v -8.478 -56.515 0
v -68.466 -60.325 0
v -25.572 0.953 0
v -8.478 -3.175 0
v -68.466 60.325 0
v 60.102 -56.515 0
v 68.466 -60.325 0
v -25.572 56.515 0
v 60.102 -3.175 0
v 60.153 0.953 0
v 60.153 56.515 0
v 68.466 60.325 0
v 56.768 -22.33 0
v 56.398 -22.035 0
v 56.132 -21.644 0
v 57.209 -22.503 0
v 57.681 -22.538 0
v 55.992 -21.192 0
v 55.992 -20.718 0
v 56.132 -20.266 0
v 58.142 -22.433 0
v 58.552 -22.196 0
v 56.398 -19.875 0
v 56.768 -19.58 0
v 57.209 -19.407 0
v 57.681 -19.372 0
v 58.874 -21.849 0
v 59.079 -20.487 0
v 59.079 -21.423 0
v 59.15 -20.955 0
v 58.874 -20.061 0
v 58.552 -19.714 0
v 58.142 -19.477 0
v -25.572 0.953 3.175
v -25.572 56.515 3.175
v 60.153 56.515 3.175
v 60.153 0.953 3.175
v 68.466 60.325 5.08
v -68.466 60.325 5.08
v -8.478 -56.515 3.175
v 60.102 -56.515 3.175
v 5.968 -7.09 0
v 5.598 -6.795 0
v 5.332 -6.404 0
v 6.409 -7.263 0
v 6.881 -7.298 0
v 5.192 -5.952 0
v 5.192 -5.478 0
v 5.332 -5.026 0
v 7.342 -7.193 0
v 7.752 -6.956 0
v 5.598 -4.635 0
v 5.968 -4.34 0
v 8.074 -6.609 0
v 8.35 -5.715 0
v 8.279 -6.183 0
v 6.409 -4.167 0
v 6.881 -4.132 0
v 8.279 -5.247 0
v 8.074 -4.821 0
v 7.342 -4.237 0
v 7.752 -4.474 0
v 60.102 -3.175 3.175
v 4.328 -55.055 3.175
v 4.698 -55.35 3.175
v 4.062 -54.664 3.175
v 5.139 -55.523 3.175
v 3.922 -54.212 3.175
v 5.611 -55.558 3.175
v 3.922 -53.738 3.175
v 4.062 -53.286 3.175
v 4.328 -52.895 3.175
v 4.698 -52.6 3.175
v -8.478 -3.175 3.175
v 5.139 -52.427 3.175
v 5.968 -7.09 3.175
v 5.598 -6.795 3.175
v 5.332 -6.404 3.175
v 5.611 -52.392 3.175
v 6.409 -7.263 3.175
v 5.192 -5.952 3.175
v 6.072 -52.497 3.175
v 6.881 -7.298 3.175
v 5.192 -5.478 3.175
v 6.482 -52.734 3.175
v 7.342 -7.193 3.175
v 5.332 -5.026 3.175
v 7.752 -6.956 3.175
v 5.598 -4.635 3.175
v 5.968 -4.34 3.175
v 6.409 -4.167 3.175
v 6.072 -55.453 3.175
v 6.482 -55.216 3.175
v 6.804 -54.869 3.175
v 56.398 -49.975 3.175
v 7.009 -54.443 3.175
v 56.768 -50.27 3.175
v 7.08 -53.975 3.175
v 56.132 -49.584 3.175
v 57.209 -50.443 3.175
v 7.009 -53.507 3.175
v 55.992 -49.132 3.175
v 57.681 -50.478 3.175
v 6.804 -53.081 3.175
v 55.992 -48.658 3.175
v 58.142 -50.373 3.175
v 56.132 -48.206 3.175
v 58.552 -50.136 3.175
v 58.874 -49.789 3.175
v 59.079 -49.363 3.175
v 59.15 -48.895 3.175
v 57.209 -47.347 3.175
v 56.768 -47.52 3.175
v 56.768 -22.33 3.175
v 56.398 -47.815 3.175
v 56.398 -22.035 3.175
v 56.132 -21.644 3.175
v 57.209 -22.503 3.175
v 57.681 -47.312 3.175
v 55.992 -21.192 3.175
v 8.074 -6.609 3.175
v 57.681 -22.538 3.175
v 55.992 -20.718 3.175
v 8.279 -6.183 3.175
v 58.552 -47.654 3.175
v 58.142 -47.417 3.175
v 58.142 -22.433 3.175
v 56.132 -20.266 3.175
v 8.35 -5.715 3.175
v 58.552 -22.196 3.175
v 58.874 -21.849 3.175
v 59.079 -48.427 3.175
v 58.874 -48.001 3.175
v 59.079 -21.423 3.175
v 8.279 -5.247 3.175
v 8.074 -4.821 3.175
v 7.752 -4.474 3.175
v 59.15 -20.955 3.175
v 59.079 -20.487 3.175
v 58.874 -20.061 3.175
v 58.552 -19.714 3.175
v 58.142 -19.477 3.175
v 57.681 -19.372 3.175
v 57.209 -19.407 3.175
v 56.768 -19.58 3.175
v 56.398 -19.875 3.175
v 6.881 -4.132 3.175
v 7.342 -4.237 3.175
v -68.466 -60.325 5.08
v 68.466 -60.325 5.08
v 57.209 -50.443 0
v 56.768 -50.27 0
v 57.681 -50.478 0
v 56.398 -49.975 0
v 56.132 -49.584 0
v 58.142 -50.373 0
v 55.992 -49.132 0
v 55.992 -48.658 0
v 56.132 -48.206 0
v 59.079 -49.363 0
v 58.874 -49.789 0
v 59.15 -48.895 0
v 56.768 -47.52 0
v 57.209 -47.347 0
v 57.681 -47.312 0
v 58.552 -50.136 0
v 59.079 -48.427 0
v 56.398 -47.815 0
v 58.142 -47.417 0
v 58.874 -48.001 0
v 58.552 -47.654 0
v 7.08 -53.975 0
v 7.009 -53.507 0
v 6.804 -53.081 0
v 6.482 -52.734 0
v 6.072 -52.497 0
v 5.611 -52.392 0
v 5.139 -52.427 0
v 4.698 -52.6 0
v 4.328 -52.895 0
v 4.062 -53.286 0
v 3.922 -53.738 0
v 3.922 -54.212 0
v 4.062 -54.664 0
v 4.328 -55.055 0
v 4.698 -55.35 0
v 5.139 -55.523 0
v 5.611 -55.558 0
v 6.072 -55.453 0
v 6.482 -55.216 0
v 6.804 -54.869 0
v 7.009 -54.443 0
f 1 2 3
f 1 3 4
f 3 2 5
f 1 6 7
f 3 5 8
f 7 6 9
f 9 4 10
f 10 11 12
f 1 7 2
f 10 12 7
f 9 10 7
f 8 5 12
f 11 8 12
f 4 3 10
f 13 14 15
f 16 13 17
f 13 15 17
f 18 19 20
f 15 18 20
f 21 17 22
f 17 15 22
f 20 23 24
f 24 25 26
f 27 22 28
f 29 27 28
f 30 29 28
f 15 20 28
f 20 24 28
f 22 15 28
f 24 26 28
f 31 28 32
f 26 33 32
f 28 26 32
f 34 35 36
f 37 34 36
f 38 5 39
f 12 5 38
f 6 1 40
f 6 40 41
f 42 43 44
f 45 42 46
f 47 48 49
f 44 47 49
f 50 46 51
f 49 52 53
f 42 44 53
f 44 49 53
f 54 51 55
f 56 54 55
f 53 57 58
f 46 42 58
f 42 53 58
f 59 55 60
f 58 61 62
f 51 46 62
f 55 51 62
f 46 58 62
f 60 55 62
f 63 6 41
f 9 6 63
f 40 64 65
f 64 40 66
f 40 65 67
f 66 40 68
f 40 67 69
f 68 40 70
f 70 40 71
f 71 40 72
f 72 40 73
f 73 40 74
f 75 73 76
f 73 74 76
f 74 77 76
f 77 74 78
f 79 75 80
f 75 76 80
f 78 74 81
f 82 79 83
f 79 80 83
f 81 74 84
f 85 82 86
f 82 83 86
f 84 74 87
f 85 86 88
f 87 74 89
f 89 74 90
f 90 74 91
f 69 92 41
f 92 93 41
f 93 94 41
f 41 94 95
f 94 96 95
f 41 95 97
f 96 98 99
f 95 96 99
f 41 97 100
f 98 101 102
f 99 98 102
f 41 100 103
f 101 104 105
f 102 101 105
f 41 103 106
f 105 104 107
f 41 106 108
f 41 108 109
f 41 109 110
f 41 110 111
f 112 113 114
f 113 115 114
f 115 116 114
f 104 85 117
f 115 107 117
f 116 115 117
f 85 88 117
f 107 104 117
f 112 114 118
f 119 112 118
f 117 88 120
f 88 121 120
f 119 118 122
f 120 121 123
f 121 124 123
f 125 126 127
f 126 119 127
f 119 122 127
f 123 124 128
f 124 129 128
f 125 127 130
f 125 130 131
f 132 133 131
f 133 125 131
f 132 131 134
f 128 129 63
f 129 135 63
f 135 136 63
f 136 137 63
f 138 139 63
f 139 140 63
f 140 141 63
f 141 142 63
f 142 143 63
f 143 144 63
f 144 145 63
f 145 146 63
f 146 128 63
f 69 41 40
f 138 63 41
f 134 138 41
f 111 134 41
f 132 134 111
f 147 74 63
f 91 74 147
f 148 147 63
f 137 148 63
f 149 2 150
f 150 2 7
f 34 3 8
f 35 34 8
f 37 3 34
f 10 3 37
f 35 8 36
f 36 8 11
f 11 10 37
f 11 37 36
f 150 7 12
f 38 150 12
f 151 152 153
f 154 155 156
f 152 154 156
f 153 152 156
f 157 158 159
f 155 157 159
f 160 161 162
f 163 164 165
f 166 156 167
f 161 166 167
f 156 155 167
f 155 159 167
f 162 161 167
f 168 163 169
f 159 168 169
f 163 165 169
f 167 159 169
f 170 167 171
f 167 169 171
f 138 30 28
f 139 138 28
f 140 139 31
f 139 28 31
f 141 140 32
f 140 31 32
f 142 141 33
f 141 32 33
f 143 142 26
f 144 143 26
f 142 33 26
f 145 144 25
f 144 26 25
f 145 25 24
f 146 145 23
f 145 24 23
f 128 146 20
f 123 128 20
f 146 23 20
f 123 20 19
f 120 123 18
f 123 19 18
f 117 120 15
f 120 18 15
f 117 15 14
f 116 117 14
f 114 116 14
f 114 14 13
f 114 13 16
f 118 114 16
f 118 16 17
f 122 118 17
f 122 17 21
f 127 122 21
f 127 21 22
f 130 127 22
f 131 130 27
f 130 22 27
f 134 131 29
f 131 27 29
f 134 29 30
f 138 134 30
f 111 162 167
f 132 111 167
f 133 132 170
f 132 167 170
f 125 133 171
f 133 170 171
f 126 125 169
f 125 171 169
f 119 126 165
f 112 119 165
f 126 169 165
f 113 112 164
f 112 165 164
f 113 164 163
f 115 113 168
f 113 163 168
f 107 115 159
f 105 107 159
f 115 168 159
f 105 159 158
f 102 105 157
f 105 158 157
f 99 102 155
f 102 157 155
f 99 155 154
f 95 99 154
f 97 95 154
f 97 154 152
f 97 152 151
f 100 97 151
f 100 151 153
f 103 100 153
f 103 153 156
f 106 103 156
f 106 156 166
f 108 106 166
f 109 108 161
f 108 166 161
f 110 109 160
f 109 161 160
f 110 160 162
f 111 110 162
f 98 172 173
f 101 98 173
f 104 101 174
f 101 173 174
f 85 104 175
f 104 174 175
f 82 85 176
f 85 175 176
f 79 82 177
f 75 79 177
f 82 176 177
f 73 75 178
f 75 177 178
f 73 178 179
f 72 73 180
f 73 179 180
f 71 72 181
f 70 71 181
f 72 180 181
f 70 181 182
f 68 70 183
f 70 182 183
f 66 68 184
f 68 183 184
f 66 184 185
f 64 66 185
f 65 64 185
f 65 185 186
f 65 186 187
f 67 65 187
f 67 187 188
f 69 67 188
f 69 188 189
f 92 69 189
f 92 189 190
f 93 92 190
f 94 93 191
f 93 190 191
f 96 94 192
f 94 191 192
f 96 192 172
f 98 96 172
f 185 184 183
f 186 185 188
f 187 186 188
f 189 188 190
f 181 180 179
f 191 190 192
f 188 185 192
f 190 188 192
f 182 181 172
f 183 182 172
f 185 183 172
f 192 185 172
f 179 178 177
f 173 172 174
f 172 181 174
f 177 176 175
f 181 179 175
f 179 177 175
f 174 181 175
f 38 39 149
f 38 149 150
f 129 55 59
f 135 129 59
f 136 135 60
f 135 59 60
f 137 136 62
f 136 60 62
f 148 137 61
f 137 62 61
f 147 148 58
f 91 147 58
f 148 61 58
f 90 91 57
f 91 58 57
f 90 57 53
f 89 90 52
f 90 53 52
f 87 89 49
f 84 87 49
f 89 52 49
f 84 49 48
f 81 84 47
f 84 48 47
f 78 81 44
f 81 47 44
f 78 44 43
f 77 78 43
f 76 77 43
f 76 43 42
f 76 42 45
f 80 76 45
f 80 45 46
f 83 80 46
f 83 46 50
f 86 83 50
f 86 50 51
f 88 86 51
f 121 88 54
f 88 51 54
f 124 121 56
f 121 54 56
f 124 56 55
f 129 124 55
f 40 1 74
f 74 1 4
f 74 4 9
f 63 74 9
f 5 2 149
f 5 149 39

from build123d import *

# Parameters (mm, degrees)
F0_W     = 136.9314
F0_H     = 120.65
F2_DEPTH = 5.08
F1_W     = 85.725
F1_H     = 55.5625
F1_W_2   = 68.58
F1_H_2   = 53.34
F1_R     = 1.5875
F3_DEPTH = 3.175


# Not quite as in the source:
# - the program builds the solid bodies; features that only make, move or delete a surface that nothing else refers to are left out


with BuildPart() as f2:
    # F0 (on Top) → F2 (new body)
    with BuildSketch(Plane.XY):
        Rectangle(F0_W, F0_H)
    extrude(amount=F2_DEPTH)

    # F1 (on Top) → F3 (cut)
    with BuildSketch(Plane.XY):
        with Locations((17.2909619287, 28.73375)):
            Rectangle(F1_W, F1_H)
        with Locations((25.8121827105, -29.845)):
            Rectangle(F1_W_2, F1_H_2)
        with Locations((5.4921827105, -53.975)):
            Circle(F1_R, mode=Mode.SUBTRACT)
        with Locations((6.7621827105, -5.715)):
            Circle(F1_R, mode=Mode.SUBTRACT)
        with Locations((57.5621827105, -48.895)):
            Circle(F1_R, mode=Mode.SUBTRACT)
        with Locations((57.5621827105, -20.955)):
            Circle(F1_R, mode=Mode.SUBTRACT)
    extrude(amount=F3_DEPTH, mode=Mode.SUBTRACT)


solid = f2.part
